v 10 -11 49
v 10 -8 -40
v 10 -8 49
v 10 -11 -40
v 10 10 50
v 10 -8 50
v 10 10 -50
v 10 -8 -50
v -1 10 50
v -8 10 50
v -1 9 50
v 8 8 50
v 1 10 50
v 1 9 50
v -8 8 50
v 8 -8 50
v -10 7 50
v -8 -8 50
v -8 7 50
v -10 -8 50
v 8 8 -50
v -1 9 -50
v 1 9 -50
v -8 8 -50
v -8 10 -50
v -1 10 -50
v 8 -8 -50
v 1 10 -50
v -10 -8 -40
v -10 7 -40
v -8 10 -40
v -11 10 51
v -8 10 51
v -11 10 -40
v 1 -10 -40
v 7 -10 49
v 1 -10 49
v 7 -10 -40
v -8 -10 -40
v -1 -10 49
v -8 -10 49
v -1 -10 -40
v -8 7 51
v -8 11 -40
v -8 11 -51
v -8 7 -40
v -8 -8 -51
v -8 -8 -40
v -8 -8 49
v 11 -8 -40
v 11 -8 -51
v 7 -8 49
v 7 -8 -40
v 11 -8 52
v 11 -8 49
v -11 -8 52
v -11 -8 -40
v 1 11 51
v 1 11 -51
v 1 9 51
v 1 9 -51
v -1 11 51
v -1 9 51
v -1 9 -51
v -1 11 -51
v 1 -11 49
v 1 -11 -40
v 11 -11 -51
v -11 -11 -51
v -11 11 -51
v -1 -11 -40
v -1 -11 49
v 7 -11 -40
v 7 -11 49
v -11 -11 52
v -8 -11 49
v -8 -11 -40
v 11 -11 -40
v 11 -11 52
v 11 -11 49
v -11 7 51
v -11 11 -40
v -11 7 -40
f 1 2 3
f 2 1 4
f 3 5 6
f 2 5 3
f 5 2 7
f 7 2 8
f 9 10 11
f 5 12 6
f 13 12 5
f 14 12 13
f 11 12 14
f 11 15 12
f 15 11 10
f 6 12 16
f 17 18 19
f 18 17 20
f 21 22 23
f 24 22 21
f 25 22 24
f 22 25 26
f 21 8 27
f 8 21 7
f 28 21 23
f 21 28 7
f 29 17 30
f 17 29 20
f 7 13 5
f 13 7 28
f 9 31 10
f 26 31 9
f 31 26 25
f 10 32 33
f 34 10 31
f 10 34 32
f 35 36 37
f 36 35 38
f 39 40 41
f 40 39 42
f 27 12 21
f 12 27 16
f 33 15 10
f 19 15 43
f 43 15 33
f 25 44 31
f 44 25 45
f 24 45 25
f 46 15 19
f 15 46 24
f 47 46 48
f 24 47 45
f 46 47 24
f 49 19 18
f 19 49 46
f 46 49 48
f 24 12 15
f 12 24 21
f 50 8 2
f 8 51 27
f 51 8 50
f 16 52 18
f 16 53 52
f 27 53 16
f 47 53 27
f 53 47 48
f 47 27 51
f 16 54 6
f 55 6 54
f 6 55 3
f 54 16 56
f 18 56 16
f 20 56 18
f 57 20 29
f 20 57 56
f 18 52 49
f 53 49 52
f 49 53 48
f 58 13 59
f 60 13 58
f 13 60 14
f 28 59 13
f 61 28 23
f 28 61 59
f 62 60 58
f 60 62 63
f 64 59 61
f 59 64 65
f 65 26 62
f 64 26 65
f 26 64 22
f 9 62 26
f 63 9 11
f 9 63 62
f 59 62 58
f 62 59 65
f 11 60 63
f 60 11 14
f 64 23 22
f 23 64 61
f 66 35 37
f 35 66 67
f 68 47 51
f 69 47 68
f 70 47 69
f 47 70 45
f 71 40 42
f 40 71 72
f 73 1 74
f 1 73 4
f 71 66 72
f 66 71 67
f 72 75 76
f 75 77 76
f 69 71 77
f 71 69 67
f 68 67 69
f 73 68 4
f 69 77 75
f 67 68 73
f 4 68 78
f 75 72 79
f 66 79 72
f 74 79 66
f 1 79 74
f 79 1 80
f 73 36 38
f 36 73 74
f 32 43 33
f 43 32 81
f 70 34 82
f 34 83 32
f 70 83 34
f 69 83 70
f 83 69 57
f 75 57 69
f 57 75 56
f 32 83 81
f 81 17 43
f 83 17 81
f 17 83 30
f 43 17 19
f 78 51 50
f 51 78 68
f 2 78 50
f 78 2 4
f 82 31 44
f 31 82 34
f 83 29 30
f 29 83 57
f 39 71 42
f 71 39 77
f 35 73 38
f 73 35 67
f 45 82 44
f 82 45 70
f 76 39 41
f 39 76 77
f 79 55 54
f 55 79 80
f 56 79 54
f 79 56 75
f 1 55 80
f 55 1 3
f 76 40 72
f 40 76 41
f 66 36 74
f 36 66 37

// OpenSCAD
// Parameters
outer_width_mm = 20; //[10:40:1]
outer_height_mm = 20; //[10:40:1]
wall_thickness_mm = 2; //[1:6:0.5]
length_mm = 100; //[20:400:1]
overlap_mm = 1; //[0.5:2:0.5]

// Box Section - Primary Component (hollow rectangular tube)
module box_section() {
  difference() {
    // Outer box
    cube([outer_width_mm, outer_height_mm, length_mm], center=true);

    // Inner void (slightly longer to avoid coplanar faces)
    cube([outer_width_mm - 2*wall_thickness_mm,
          outer_height_mm - 2*wall_thickness_mm,
          length_mm + 2*overlap_mm], center=true);
  }
}

// Long parallel side walls/strips that must be ATTACHED to the main body.
// These are placed on the +Y and -Y outer faces and overlap into the tube by overlap_mm.
module attached_side_strips() {
  strip_thick = wall_thickness_mm;                 // thickness in Y
  strip_width = wall_thickness_mm;                 // width in X (kept small like a "strip")
  strip_len   = length_mm + 2*overlap_mm;          // ensure overlap at ends too

  // Position so each strip intersects the outer wall by overlap_mm (no gap).
  y_pos = outer_height_mm/2 - strip_thick/2 + overlap_mm;

  // Two long parallel strips (top view shows them as two long lines)
  translate([0,  y_pos, 0])
    cube([strip_width, strip_thick, strip_len], center=true);

  translate([0, -y_pos, 0])
    cube([strip_width, strip_thick, strip_len], center=true);
}

// Box Corner Profile Section - Secondary Component (ensure it intersects the tube)
module box_corner_profile_section() {
  // Put it on the outside corner but overlap into the tube by overlap_mm
  x0 = -outer_width_mm/2 - overlap_mm;
  y0 = -outer_height_mm/2 - overlap_mm;

  translate([x0, y0, -length_mm/2 - overlap_mm])
    cube([wall_thickness_mm + overlap_mm,
          wall_thickness_mm + overlap_mm,
          length_mm + 2*overlap_mm], center=false);
}

// Box Bezel Section - Secondary Component (ensure it intersects the tube end)
module box_bezel_section() {
  // Place at +Z end and overlap into the tube by overlap_mm
  z0 = length_mm/2 - overlap_mm;

  translate([-outer_width_mm/2 - overlap_mm,
             -outer_height_mm/2 - overlap_mm,
              z0])
    cube([outer_width_mm + 2*overlap_mm,
          wall_thickness_mm + overlap_mm,
          wall_thickness_mm + overlap_mm], center=false);
}

// Box Corner Profile Sections - Secondary Component (ensure they intersect the tube)
module box_corner_profile_sections() {
  // Two additional corner blocks, each overlapping into the tube by overlap_mm
  z0 = -length_mm/2 - overlap_mm;

  // Near (+X, -Y) corner
  translate([ outer_width_mm/2 - wall_thickness_mm - overlap_mm,
            -outer_height_mm/2 - overlap_mm,
             z0])
    cube([wall_thickness_mm + overlap_mm,
          wall_thickness_mm + overlap_mm,
          length_mm + 2*overlap_mm], center=false);

  // Near (-X, +Y) corner
  translate([-outer_width_mm/2 - overlap_mm,
              outer_height_mm/2 - wall_thickness_mm - overlap_mm,
              z0])
    cube([wall_thickness_mm + overlap_mm,
          wall_thickness_mm + overlap_mm,
          length_mm + 2*overlap_mm], center=false);
}

// Box Shelf Bracket Section - Secondary Component (ensure it intersects the tube)
module box_shelf_bracket_section() {
  // Keep original idea but attach by overlapping into the tube at the -Z end
  bracket_h = 10;
  z0 = -length_mm/2 - overlap_mm; // overlap into tube end

  difference() {
    union() {
      // Vertical plate (along X, thin in Y)
      translate([-outer_width_mm/2 - overlap_mm,
                 -outer_height_mm/2 - overlap_mm,
                  z0])
        cube([outer_width_mm + 2*overlap_mm,
              wall_thickness_mm + overlap_mm,
              bracket_h + overlap_mm], center=false);

      // Horizontal plate (along Y, thin in X)
      translate([-outer_width_mm/2 - overlap_mm,
                 -outer_height_mm/2 - overlap_mm,
                  z0])
        cube([wall_thickness_mm + overlap_mm,
              outer_height_mm + 2*overlap_mm,
              bracket_h + overlap_mm], center=false);
    }

    // Mounting holes (kept as-is, centered in the bracket volume)
    translate([-outer_width_mm/4, -outer_height_mm/4, -length_mm/2 + bracket_h/2])
      cylinder(r=1.5, h=bracket_h + 2*overlap_mm, center=true, $fn=16);

    translate([ outer_width_mm/4,  outer_height_mm/4, -length_mm/2 + bracket_h/2])
      cylinder(r=1.5, h=bracket_h + 2*overlap_mm, center=true, $fn=16);
  }
}

// Assembly (single connected solid)
module assembly() {
  union() {
    box_section();

    // FIX: attach the two long parallel strips to the main body with overlap
    attached_side_strips();

    // Other secondary components, adjusted to overlap/intersect the main body
    box_corner_profile_section();
    box_bezel_section();
    box_corner_profile_sections();
    box_shelf_bracket_section();
  }
}

assembly();
